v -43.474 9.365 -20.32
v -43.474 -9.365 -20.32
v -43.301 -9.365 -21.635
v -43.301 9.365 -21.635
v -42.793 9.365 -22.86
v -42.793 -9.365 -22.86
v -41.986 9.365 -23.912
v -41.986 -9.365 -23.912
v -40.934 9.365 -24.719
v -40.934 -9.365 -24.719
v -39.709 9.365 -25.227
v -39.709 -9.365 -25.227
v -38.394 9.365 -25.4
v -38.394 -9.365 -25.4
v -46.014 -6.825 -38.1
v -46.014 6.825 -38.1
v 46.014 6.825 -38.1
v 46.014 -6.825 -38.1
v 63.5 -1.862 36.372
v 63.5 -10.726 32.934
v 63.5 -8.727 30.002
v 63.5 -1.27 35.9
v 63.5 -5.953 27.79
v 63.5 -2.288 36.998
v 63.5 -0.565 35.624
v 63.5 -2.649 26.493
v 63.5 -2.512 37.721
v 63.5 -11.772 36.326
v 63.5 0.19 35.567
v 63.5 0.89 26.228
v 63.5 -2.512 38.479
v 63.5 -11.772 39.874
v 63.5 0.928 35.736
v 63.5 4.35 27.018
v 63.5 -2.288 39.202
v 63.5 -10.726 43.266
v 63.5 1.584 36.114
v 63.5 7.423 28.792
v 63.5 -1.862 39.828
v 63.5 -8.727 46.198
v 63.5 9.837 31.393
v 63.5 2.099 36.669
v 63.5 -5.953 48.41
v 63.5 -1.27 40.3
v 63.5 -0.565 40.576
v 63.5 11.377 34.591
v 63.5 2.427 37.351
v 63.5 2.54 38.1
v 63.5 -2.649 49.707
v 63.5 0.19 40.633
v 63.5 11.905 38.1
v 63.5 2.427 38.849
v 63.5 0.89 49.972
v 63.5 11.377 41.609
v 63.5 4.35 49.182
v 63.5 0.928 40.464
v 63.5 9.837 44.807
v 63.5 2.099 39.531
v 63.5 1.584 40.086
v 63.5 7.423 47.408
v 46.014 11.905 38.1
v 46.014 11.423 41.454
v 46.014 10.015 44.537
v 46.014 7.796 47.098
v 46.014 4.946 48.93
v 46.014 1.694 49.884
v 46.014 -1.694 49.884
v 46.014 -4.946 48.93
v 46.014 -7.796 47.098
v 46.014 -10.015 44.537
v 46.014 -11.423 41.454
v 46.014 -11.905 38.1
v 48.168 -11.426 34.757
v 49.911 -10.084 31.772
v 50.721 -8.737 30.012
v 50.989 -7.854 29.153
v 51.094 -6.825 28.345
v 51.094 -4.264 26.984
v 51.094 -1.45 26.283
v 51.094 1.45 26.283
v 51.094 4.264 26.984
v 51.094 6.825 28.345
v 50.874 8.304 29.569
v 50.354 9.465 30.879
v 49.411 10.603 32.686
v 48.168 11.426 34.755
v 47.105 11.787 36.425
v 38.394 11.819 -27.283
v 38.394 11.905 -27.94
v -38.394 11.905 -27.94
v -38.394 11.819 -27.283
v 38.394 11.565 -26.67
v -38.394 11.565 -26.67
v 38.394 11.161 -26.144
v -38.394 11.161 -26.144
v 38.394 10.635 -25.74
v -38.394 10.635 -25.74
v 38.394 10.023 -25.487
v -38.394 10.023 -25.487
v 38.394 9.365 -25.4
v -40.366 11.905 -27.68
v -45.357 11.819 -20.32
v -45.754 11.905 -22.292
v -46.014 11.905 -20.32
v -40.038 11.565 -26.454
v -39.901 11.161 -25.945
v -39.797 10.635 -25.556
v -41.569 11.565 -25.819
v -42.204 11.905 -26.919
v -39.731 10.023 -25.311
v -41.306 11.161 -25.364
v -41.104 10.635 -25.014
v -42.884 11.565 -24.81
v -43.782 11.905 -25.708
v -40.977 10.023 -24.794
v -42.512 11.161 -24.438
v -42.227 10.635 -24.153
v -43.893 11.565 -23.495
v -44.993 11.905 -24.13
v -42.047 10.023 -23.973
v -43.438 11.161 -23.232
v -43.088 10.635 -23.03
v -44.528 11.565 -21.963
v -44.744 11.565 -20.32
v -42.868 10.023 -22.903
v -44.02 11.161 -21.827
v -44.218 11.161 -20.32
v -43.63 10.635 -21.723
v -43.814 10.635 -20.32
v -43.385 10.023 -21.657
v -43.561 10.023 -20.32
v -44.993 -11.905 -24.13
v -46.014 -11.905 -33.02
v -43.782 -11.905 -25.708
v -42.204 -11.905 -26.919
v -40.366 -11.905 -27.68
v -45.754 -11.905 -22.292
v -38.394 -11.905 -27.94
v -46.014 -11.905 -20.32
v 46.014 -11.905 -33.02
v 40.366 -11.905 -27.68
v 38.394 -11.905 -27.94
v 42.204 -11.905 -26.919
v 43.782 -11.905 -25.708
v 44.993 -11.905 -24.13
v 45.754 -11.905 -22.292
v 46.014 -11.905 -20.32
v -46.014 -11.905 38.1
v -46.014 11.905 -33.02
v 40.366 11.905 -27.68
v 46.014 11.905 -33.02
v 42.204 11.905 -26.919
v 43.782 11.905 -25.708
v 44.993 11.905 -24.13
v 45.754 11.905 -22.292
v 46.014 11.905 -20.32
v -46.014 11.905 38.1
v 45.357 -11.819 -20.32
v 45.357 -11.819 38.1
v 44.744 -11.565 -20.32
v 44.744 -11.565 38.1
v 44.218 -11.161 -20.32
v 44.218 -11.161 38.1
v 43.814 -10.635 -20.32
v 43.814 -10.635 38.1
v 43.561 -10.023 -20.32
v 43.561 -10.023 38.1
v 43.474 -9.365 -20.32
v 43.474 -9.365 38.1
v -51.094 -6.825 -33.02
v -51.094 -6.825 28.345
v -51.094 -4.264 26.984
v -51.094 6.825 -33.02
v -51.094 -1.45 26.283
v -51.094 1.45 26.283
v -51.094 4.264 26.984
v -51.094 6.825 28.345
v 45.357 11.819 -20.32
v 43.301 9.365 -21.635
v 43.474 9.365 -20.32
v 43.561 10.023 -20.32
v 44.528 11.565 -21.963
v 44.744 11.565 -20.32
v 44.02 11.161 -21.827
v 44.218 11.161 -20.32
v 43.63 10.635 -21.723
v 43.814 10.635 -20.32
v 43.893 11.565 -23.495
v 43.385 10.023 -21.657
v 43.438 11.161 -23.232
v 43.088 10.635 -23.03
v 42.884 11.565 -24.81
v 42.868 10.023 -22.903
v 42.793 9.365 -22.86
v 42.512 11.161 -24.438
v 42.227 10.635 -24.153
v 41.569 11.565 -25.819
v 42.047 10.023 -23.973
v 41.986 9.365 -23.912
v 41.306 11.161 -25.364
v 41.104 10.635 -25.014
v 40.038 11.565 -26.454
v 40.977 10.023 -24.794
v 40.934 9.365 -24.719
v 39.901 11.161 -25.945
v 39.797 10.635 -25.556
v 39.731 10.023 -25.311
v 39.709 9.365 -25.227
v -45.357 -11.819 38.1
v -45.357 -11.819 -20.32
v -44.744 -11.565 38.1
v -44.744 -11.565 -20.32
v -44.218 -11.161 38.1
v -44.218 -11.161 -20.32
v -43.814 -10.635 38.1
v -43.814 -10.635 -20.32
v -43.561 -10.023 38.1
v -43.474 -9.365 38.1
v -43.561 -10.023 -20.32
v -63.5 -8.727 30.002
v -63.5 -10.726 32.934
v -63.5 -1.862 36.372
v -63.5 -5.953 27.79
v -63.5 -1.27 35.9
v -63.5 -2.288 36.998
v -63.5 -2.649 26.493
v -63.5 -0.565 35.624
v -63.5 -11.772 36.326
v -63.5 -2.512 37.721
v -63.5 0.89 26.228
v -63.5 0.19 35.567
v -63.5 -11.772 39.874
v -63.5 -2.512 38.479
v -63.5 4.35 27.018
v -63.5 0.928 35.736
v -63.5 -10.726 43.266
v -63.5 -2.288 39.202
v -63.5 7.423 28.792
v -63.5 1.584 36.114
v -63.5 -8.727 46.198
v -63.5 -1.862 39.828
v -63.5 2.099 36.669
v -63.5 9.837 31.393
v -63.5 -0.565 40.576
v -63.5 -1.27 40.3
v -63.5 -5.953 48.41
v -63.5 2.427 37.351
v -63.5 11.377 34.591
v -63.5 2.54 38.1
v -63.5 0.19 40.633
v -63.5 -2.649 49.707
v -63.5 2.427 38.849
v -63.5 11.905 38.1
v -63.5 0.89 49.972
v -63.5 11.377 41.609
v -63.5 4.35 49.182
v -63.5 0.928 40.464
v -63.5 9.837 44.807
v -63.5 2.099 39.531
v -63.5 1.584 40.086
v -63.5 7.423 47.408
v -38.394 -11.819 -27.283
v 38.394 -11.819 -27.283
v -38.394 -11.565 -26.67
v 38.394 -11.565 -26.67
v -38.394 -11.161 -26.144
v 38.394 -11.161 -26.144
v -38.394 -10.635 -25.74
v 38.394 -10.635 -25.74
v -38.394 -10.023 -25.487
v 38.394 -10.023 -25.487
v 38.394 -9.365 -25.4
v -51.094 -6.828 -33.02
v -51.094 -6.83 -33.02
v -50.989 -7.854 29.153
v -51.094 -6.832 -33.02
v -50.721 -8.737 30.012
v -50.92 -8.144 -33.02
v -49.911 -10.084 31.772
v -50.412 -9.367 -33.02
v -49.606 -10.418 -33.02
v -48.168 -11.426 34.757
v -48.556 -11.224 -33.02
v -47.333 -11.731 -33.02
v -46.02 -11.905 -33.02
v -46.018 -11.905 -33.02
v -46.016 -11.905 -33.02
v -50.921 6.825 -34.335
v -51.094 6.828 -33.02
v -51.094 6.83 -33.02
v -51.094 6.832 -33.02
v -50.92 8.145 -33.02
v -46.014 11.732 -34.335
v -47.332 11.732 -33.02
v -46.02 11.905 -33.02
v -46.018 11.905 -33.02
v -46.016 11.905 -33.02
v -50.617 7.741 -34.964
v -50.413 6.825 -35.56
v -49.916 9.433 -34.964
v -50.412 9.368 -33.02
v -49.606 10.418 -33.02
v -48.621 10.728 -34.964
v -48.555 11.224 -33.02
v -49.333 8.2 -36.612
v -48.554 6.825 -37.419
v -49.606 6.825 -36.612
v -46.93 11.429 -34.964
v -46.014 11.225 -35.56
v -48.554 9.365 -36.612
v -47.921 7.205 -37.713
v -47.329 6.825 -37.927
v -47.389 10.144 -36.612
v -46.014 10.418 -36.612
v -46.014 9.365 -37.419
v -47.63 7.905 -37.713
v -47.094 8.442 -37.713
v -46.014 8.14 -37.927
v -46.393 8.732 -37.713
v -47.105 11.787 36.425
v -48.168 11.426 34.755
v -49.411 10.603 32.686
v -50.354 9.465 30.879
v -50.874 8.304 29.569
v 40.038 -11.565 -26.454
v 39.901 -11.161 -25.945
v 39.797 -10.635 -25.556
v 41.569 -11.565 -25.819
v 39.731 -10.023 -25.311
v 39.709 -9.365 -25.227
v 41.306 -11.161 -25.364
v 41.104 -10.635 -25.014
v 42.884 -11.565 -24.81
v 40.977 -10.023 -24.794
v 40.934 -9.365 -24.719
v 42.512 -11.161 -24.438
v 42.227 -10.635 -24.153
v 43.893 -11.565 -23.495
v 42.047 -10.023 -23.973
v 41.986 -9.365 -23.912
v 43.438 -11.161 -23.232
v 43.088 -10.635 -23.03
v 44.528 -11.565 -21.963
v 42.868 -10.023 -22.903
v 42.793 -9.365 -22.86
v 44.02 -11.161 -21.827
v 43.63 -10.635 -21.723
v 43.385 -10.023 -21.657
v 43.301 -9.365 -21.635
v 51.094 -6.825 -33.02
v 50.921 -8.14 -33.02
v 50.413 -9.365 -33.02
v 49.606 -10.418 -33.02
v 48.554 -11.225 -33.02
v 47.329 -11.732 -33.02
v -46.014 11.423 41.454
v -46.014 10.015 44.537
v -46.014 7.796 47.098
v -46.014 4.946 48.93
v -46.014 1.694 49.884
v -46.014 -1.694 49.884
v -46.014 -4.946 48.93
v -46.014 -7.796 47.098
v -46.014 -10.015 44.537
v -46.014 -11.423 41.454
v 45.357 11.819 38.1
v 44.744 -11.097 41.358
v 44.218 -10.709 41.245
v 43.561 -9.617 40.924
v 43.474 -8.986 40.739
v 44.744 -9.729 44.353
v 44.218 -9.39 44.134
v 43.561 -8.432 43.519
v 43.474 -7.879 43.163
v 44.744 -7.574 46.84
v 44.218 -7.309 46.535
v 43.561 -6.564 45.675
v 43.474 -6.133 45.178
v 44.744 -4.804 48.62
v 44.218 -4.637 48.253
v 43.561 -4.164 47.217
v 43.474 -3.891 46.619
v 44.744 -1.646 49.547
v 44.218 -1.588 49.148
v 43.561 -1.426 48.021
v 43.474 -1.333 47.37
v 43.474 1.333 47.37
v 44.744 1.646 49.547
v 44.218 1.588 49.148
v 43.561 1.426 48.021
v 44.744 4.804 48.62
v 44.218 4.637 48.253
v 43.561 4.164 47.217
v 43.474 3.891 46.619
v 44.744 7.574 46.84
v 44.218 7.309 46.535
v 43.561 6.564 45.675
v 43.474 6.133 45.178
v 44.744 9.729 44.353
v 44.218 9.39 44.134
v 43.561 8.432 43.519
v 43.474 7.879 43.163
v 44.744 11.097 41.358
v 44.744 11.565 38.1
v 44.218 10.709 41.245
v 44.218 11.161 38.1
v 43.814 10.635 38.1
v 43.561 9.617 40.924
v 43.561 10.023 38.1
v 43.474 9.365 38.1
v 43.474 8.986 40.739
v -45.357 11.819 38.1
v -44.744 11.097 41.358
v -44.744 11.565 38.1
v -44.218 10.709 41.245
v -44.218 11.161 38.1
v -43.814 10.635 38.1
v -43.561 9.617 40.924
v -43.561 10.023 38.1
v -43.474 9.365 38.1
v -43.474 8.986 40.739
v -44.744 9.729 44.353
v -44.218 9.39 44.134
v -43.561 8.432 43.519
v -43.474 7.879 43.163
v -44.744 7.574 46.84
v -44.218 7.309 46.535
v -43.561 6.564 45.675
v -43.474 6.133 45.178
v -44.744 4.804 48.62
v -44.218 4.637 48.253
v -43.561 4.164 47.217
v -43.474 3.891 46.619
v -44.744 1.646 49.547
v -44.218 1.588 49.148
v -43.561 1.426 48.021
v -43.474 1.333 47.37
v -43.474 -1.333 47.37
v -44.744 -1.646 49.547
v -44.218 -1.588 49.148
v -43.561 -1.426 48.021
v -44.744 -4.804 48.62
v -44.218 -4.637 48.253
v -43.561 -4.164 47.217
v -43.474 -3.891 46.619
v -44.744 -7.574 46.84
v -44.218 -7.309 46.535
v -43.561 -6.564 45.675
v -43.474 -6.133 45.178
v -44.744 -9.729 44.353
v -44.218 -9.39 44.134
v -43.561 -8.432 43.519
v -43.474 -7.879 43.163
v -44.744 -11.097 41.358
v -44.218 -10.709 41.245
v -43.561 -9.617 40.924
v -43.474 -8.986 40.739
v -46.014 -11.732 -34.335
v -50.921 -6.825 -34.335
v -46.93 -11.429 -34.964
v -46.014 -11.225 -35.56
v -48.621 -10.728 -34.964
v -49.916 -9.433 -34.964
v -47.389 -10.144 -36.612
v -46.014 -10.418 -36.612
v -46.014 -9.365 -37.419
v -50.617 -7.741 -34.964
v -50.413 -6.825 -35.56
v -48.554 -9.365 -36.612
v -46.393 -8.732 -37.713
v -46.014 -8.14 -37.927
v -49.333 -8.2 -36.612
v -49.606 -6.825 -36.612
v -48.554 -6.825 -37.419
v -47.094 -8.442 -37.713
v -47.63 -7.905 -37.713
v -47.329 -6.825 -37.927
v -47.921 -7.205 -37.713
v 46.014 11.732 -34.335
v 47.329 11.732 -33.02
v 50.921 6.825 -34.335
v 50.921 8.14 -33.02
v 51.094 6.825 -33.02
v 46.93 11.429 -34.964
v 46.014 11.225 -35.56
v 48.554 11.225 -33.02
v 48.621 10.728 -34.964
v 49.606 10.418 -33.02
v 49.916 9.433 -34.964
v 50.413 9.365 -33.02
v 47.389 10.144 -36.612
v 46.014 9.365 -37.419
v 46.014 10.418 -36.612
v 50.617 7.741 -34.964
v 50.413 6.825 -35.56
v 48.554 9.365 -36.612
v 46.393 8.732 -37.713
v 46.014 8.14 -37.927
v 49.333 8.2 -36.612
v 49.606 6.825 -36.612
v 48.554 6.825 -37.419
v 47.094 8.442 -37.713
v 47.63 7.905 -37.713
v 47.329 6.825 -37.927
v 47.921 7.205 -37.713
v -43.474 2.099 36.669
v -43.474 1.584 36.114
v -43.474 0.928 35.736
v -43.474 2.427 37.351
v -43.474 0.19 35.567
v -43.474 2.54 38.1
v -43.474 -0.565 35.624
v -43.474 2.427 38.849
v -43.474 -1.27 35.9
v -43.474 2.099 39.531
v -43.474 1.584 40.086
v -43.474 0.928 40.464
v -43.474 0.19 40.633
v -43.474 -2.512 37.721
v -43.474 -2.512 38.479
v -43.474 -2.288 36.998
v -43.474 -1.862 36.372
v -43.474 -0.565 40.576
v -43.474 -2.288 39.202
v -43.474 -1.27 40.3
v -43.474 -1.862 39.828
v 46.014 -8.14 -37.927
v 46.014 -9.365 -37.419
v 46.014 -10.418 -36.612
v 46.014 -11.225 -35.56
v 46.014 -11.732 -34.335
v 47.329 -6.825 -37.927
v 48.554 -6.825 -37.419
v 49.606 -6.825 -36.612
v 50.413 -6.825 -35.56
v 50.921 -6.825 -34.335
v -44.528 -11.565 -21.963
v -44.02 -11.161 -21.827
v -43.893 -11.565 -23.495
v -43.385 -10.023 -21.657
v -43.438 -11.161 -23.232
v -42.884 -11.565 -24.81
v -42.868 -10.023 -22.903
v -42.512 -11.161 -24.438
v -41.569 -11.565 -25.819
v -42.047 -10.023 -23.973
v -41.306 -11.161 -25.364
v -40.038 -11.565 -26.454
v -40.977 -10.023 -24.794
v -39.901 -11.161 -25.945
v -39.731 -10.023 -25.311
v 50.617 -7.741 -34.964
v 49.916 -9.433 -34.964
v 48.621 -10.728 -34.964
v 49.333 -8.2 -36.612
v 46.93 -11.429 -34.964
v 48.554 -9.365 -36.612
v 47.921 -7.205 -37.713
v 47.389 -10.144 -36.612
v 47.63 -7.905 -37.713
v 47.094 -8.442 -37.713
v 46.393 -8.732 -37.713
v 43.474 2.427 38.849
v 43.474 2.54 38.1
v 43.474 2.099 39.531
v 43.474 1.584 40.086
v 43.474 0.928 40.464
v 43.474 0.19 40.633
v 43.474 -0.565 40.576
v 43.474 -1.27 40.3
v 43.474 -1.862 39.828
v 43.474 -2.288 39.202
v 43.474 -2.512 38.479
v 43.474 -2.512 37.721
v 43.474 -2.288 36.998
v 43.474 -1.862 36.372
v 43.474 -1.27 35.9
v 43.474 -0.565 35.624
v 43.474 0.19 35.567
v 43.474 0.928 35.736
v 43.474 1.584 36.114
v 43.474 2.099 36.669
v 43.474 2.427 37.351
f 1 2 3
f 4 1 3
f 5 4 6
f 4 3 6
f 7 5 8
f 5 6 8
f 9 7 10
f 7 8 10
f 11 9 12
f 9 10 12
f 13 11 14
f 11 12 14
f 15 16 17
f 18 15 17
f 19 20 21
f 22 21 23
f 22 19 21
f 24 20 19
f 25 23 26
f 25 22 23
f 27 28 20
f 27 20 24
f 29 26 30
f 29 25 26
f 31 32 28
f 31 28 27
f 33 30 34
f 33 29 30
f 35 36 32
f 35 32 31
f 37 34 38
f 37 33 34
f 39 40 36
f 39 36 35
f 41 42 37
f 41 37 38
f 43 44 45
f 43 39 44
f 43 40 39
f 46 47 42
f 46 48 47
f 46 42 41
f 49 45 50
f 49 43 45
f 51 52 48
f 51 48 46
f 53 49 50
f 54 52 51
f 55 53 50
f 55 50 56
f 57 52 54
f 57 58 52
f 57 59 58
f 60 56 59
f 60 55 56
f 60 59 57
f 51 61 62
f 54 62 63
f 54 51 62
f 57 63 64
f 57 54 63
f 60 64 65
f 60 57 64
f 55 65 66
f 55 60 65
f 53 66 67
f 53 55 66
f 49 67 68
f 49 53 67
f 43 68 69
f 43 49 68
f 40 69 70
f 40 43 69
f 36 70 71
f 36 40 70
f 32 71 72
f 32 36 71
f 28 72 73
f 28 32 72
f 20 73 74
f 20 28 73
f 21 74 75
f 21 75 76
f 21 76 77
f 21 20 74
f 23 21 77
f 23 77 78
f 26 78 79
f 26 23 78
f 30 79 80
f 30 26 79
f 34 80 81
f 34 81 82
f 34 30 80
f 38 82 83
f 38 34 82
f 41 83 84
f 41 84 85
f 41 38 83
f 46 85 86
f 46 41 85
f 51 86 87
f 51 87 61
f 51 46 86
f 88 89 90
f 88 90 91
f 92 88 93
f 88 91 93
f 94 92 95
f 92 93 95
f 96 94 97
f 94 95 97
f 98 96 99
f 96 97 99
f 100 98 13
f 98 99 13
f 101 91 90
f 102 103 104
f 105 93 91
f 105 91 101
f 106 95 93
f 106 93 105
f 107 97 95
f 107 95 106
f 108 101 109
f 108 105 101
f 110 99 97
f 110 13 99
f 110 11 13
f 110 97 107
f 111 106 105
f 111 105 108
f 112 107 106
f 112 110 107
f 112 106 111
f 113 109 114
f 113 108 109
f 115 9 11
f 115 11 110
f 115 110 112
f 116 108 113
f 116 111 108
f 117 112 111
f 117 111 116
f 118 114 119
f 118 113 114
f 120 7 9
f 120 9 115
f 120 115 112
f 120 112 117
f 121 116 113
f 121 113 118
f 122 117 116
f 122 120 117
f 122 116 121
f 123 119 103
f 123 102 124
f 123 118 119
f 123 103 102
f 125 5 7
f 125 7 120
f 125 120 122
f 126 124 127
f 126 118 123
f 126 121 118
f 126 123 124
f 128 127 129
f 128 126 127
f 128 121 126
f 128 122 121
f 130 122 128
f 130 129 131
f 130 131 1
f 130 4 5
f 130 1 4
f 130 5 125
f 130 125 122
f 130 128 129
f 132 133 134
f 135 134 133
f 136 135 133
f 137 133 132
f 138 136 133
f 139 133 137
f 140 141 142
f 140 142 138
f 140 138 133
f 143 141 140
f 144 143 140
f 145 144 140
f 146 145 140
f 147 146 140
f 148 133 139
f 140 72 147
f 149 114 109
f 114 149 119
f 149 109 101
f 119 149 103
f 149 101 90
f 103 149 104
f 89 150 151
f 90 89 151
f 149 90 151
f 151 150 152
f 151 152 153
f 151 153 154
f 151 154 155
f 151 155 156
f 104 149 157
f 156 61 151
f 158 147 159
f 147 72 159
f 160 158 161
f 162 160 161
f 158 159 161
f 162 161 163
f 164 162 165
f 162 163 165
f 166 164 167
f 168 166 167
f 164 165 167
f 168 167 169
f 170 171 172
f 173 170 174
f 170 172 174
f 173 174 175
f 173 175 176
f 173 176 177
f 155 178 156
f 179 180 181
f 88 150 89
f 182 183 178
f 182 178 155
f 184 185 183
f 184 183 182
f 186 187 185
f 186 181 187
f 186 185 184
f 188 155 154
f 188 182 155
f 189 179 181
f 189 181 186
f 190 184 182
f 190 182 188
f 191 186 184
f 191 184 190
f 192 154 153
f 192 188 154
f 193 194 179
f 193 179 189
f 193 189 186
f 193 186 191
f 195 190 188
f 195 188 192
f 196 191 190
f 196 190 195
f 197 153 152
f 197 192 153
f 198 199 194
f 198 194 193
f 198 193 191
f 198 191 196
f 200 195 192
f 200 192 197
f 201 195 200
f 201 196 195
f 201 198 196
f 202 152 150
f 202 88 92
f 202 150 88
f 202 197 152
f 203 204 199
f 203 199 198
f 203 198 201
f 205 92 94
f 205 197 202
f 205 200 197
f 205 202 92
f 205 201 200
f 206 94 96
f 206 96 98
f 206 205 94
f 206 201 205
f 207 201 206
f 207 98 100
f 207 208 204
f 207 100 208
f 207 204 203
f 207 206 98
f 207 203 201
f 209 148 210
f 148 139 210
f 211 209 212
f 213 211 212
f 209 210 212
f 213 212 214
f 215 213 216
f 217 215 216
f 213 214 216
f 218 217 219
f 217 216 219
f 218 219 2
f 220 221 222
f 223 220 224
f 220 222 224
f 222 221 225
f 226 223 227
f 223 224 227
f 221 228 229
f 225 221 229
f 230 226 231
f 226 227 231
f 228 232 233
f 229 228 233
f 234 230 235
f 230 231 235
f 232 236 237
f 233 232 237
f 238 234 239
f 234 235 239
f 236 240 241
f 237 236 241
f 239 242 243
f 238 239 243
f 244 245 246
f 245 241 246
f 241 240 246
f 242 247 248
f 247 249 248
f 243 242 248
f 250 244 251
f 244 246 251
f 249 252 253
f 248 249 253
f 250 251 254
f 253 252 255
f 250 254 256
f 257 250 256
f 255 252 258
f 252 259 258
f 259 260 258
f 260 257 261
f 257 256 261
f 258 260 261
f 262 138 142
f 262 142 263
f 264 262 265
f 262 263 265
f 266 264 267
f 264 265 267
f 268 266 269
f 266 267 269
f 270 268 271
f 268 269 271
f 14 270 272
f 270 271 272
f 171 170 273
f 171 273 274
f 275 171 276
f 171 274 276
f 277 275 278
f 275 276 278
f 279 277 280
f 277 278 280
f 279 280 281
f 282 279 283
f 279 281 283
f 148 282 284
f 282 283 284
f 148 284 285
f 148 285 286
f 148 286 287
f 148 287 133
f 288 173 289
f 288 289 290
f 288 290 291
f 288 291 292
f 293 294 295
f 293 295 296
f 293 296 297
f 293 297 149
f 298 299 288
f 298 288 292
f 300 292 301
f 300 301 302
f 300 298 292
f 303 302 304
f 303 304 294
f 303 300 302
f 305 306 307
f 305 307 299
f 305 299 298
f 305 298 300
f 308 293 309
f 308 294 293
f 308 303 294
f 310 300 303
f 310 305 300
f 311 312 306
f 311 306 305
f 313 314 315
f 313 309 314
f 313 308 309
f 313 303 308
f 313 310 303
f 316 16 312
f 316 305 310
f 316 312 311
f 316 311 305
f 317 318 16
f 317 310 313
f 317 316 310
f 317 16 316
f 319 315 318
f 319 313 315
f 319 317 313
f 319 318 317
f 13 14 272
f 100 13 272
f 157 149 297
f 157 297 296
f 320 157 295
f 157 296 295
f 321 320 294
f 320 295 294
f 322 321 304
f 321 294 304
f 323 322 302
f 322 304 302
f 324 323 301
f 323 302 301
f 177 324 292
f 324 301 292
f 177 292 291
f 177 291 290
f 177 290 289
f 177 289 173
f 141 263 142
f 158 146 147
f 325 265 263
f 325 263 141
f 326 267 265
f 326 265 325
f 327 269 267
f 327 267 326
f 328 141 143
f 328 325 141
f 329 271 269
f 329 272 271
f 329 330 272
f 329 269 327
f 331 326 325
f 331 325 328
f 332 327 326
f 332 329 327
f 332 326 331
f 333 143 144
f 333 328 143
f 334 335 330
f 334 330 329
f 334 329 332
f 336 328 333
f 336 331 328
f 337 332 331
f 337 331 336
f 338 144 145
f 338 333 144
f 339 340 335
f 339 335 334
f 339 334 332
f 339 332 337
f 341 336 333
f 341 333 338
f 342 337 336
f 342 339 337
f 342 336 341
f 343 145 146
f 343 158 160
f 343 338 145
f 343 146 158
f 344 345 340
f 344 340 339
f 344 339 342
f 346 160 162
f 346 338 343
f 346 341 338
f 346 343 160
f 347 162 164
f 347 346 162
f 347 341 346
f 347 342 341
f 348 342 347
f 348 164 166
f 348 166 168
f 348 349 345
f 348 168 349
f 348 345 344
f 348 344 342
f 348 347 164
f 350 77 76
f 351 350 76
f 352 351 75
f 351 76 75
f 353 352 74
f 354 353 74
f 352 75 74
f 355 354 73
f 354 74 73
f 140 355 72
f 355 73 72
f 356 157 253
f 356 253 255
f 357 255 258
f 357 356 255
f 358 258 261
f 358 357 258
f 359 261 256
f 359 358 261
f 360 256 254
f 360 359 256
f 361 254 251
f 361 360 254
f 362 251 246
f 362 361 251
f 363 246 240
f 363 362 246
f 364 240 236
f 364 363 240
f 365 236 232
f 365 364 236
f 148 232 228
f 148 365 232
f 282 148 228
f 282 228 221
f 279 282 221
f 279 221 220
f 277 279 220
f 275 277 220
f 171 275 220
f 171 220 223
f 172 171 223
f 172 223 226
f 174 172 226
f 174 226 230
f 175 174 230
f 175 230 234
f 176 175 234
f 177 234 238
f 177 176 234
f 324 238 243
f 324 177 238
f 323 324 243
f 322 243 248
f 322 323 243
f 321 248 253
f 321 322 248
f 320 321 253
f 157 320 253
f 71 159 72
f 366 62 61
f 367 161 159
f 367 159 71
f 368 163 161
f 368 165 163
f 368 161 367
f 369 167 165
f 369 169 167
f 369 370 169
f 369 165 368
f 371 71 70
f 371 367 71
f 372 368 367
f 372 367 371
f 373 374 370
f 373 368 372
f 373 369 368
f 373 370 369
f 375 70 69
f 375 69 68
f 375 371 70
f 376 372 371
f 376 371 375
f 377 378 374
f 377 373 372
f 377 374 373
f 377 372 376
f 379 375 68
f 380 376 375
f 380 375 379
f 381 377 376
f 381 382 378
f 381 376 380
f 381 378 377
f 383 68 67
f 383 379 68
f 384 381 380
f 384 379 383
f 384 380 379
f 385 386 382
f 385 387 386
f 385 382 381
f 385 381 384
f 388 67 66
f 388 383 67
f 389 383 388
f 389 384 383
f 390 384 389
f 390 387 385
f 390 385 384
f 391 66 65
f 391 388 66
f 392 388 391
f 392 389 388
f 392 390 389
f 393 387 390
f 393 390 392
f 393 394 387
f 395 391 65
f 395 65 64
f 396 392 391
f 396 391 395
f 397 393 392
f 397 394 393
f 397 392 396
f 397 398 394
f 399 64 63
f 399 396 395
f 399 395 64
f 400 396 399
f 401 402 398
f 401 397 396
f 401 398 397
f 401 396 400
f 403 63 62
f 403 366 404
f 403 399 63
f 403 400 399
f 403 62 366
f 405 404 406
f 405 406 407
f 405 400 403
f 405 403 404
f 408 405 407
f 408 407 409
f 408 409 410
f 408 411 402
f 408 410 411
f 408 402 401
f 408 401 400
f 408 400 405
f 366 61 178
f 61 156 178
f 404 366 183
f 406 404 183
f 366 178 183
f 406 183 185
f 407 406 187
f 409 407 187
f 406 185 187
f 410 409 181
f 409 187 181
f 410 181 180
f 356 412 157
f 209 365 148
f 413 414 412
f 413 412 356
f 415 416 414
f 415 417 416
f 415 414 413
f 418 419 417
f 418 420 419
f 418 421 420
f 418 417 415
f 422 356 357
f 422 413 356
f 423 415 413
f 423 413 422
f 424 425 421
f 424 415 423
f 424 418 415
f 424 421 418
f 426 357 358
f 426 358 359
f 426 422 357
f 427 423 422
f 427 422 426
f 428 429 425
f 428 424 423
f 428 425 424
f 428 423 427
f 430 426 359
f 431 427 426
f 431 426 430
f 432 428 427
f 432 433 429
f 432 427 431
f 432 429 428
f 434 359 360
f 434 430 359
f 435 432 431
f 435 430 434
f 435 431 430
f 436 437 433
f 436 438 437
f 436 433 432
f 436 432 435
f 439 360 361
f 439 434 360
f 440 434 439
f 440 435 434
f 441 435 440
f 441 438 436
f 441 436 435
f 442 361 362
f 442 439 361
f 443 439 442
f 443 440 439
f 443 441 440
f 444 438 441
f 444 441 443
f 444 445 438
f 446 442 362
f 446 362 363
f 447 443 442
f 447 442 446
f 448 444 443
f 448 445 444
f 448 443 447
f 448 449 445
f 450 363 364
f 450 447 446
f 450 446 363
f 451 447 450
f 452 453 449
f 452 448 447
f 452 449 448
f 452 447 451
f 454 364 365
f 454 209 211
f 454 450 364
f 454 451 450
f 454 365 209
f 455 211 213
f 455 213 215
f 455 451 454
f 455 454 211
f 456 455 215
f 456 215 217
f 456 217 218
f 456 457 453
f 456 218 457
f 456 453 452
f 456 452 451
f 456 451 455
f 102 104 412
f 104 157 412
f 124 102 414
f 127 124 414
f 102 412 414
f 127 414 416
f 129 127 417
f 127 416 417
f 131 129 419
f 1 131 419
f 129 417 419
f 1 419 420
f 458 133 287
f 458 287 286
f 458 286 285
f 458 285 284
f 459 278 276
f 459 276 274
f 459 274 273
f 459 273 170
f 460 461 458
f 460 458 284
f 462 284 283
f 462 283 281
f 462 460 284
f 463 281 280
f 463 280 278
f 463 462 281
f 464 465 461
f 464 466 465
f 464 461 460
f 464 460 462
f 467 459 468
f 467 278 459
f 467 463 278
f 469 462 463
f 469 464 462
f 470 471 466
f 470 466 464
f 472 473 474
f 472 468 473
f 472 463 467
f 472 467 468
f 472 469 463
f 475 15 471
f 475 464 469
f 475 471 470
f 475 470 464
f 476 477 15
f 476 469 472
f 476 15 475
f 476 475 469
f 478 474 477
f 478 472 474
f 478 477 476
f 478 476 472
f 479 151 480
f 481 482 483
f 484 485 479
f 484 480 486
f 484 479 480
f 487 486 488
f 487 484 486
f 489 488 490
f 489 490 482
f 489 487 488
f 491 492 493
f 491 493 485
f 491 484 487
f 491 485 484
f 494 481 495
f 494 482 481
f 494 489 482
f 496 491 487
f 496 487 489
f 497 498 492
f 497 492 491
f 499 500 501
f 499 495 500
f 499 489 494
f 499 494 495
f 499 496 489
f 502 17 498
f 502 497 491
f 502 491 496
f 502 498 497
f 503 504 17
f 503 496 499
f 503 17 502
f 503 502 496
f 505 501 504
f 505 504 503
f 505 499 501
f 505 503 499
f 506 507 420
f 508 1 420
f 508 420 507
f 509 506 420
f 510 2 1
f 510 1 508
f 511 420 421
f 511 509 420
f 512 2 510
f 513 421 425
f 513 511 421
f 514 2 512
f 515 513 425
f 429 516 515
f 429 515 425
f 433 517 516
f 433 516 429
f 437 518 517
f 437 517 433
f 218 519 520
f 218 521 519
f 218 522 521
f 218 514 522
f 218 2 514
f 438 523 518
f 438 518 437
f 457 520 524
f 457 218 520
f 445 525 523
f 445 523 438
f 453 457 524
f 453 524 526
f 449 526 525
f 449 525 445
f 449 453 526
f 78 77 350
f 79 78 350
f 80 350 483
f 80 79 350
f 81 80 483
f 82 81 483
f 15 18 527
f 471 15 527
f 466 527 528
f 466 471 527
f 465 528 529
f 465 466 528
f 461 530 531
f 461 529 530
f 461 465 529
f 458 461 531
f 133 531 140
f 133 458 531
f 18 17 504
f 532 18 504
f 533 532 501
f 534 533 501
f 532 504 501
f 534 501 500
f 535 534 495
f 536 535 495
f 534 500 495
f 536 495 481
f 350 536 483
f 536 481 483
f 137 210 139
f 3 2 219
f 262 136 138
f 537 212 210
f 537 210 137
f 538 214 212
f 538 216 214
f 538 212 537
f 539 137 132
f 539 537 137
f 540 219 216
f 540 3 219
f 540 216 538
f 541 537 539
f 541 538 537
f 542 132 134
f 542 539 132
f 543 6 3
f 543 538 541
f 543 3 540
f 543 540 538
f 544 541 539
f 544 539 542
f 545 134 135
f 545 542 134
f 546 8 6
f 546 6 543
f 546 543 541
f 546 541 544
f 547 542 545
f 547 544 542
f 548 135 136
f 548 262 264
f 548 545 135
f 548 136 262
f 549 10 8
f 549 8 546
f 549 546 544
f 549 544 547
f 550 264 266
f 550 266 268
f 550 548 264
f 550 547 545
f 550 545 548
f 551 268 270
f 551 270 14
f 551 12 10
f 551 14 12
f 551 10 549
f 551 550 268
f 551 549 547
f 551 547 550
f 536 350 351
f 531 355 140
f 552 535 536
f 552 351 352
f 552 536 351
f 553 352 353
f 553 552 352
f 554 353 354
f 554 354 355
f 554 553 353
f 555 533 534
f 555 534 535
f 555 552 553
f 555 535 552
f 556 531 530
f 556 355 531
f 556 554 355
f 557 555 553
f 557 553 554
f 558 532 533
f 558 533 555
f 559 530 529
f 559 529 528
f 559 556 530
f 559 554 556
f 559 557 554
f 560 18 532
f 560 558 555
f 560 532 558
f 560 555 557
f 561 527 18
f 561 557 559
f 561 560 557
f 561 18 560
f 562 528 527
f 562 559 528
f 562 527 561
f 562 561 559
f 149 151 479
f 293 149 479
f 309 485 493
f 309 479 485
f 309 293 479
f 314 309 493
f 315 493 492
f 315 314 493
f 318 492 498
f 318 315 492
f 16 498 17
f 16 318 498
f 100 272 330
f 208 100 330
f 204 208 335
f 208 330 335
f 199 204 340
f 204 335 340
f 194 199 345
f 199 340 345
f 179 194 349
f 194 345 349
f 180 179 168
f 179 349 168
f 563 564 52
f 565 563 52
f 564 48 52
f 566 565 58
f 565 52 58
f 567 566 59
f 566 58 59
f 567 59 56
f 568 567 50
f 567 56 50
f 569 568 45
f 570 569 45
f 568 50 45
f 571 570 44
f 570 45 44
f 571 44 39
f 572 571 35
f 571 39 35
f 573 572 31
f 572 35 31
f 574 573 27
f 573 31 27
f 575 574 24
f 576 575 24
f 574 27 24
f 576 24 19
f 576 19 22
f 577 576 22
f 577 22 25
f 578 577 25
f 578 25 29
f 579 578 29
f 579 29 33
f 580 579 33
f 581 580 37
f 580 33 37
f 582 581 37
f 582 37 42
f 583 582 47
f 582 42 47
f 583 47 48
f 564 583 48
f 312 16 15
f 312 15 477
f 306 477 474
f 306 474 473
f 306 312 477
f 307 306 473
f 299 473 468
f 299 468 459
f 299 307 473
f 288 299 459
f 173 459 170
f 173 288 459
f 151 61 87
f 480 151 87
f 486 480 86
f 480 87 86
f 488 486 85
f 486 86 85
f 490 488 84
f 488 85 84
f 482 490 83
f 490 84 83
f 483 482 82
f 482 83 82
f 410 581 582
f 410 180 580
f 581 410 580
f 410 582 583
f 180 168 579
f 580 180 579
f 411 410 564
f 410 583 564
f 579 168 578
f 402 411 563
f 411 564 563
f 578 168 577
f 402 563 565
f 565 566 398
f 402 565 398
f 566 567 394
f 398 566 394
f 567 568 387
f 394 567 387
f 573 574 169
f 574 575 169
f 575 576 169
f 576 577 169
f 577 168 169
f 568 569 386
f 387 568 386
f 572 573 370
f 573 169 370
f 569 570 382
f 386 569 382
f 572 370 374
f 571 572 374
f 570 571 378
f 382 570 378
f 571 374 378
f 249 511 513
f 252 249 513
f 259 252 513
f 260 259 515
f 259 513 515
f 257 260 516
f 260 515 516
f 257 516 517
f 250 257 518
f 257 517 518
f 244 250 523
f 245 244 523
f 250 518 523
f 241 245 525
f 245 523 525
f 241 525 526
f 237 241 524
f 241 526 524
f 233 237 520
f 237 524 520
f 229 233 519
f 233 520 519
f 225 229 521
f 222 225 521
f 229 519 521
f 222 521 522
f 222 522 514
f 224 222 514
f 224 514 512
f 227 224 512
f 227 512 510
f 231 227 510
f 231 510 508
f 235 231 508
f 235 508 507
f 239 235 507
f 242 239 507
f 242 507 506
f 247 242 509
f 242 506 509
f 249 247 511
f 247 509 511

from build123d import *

# Parameters (mm, degrees)
F0_W          = 102.1880283952
F0_H          = 23.8108858466
F1_DEPTH      = 38.1
F2_R          = 11.9054429233
F3_DEPTH      = 63.5
F4_W          = 86.9480283952
F4_H          = 88.2315921943
F5_DEPTH      = 25.4
F6_R          = 2.54
F7_DEPTH      = 63.5
F8_T1_DEPTH   = 127.5880283952
F8_T6_DEPTH   = 101.6
F8_S7_R       = 11.9054429233
F8_T8_DEPTH   = 52
F8_T12_DEPTH  = 101.6
F8_S13_R      = 11.9054429233
F8_T14_DEPTH  = 52
F9_T1_DEPTH   = 127.5880283952
F9_T6_DEPTH   = 101.6
F9_S7_R       = 11.9054429233
F9_T8_DEPTH   = 52
F9_T12_DEPTH  = 101.6
F9_S13_R      = 11.9054429233
F9_T14_DEPTH  = 52
F10_T1_DEPTH  = 13.6508858466
F10_S5_W      = 5.08
F10_S5_H      = 5.08
F10_T6_DEPTH  = 5.08
F10_S11_W     = 5.08
F10_S11_H     = 5.08
F10_T12_DEPTH = 5.08
F10_S17_W     = 5.08
F10_S17_H     = 5.08
F10_T18_DEPTH = 5.08
F10_S23_W     = 5.08
F10_S23_H     = 5.08
F10_T24_DEPTH = 5.08
F11_R         = 5.08
F12_R         = 2.53999


# Not quite as in the source:
# - a fillet or chamfer that OpenCascade refuses, or shapes differently, is made with other operations: its cross-section is extruded or revolved along the edge and cut away or added
# - a fillet or chamfer is up to 0.001 mm smaller than in the source, because OpenCascade refuses the exact size


with BuildPart() as f1:
    # F0 (on Top) → F1 (new body, symmetric)
    with BuildSketch(Plane.XY):
        Rectangle(F0_W, F0_H)
    extrude(amount=F1_DEPTH, both=True)

    # F2 (on Right) → F3 (join, symmetric)
    with BuildSketch(Plane.YZ):
        with Locations((0, 38.1)):
            Circle(F2_R)
    extrude(amount=F3_DEPTH, both=True)

    # F4 (on Front) → F5 (cut, symmetric)
    with BuildSketch(Plane.XZ):
        with Locations((0, 18.7157960971)):
            Rectangle(F4_W, F4_H)
    extrude(amount=F5_DEPTH, both=True, mode=Mode.SUBTRACT)

    # F6 (on Right) → F7 (cut, symmetric)
    with BuildSketch(Plane.YZ):
        with Locations((0, 38.1)):
            Circle(F6_R)
    extrude(amount=F7_DEPTH, both=True, mode=Mode.SUBTRACT)

    # F8: fillet of radius 5.08 on 3 edges, made by hand

    # F8_s2 → F8_t1 (cut)
    with BuildSketch(Plane.YZ.offset(-63.7940141976)):
        with BuildLine():
            ThreePointArc((-6.8254429233, -38.1), (-10.4175453717, -36.6121024484), (-11.9054429233, -33.02))
            Line((-11.9054429233, -33.02), (-11.9054429233, -38.1))
            Line((-11.9054429233, -38.1), (-6.8254429233, -38.1))
        make_face()
    extrude(amount=F8_T1_DEPTH, mode=Mode.SUBTRACT)


with BuildPart() as f8_tool4:
    # F8_s5 → F8_t6 (new body)
    with BuildSketch(Plane.XY.offset(50.8)):
        with BuildLine():
            ThreePointArc((51.0940141976, -6.8254429233), (49.606116646, -10.4175453717), (46.0140141976, -11.9054429233))
            Line((46.0140141976, -11.9054429233), (51.0940141976, -11.9054429233))
            Line((51.0940141976, -11.9054429233), (51.0940141976, -6.8254429233))
        make_face()
    extrude(amount=-F8_T6_DEPTH)

    # F8_s7 → F8_t8 (cut, symmetric)
    with BuildSketch(Plane.YZ.offset(48.6)):
        with Locations((0, 38.1)):
            Circle(F8_S7_R)
    extrude(amount=F8_T8_DEPTH, both=True, mode=Mode.SUBTRACT)


with BuildPart() as f1_1:
    add(f1.part)

    # F8_t3: cut F8_tool4
    add(f8_tool4.part, mode=Mode.SUBTRACT)


with BuildPart() as f8_tool10:
    # F8_s11 → F8_t12 (new body)
    with BuildSketch(Plane.XY.offset(-50.8)):
        with BuildLine():
            ThreePointArc((-51.0940141976, -6.8254429233), (-49.606116646, -10.4175453717), (-46.0140141976, -11.9054429233))
            Line((-46.0140141976, -11.9054429233), (-51.0940141976, -11.9054429233))
            Line((-51.0940141976, -11.9054429233), (-51.0940141976, -6.8254429233))
        make_face()
    extrude(amount=F8_T12_DEPTH)

    # F8_s13 → F8_t14 (cut, symmetric)
    with BuildSketch(Plane.YZ.offset(-48.6)):
        with Locations((0, 38.1)):
            Circle(F8_S13_R)
    extrude(amount=F8_T14_DEPTH, both=True, mode=Mode.SUBTRACT)


with BuildPart() as f1_2:
    add(f1_1.part)

    # F8_t9: cut F8_tool10
    add(f8_tool10.part, mode=Mode.SUBTRACT)

    # F9: fillet of radius 5.08 on 3 edges, made by hand

    # F9_s2 → F9_t1 (cut)
    with BuildSketch(Plane.YZ.offset(-63.7940141976)):
        with BuildLine():
            ThreePointArc((11.9054429233, -33.02), (10.4175453717, -36.6121024484), (6.8254429233, -38.1))
            Line((6.8254429233, -38.1), (11.9054429233, -38.1))
            Line((11.9054429233, -38.1), (11.9054429233, -33.02))
        make_face()
    extrude(amount=F9_T1_DEPTH, mode=Mode.SUBTRACT)


with BuildPart() as f9_tool4:
    # F9_s5 → F9_t6 (new body)
    with BuildSketch(Plane.XY.offset(-50.8)):
        with BuildLine():
            ThreePointArc((-46.0140141976, 11.9054429233), (-49.606116646, 10.4175453717), (-51.0940141976, 6.8254429233))
            Line((-51.0940141976, 6.8254429233), (-51.0940141976, 11.9054429233))
            Line((-51.0940141976, 11.9054429233), (-46.0140141976, 11.9054429233))
        make_face()
    extrude(amount=F9_T6_DEPTH)

    # F9_s7 → F9_t8 (cut, symmetric)
    with BuildSketch(Plane.YZ.offset(-48.6)):
        with Locations((0, 38.1)):
            Circle(F9_S7_R)
    extrude(amount=F9_T8_DEPTH, both=True, mode=Mode.SUBTRACT)


with BuildPart() as f1_3:
    add(f1_2.part)

    # F9_t3: cut F9_tool4
    add(f9_tool4.part, mode=Mode.SUBTRACT)


with BuildPart() as f9_tool10:
    # F9_s11 → F9_t12 (new body)
    with BuildSketch(Plane.XY.offset(50.8)):
        with BuildLine():
            ThreePointArc((46.0140141976, 11.9054429233), (49.606116646, 10.4175453717), (51.0940141976, 6.8254429233))
            Line((51.0940141976, 6.8254429233), (51.0940141976, 11.9054429233))
            Line((51.0940141976, 11.9054429233), (46.0140141976, 11.9054429233))
        make_face()
    extrude(amount=-F9_T12_DEPTH)

    # F9_s13 → F9_t14 (cut, symmetric)
    with BuildSketch(Plane.YZ.offset(48.6)):
        with Locations((0, 38.1)):
            Circle(F9_S13_R)
    extrude(amount=F9_T14_DEPTH, both=True, mode=Mode.SUBTRACT)


with BuildPart() as f1_4:
    add(f1_3.part)

    # F9_t9: cut F9_tool10
    add(f9_tool10.part, mode=Mode.SUBTRACT)

    # F10: fillet of radius 5.08 on 2 edges, made by hand

    # F10_s2 → F10_t1 (cut)
    with BuildSketch(Plane.XZ.offset(-6.8254429233)):
        with BuildLine():
            ThreePointArc((-46.0140141976, -38.1), (-49.606116646, -36.6121024484), (-51.0940141976, -33.02))
            Line((-51.0940141976, -33.02), (-51.0940141976, -38.1))
            Line((-51.0940141976, -38.1), (-46.0140141976, -38.1))
        make_face()
        with BuildLine():
            ThreePointArc((46.0140141976, -38.1), (49.606116646, -36.6121024484), (51.0940141976, -33.02))
            Line((51.0940141976, -33.02), (51.0940141976, -38.1))
            Line((51.0940141976, -38.1), (46.0140141976, -38.1))
        make_face()
    extrude(amount=F10_T1_DEPTH, mode=Mode.SUBTRACT)


with BuildPart() as f10_tool4:
    # F10_s5 → F10_t6 (new body)
    with BuildSketch(Plane.XY.offset(-33.02)):
        with Locations((48.5540141976, -9.3654429233)):
            Rectangle(F10_S5_W, F10_S5_H)
    extrude(amount=-F10_T6_DEPTH)

    # F10_s7 → F10_t8 (revolve, cut)
    with BuildSketch(Plane(origin=(46.0140141976, -6.8254429233, -33.02), x_dir=(-0.7071067812, 0.7071067812, 0), z_dir=(-0.7071067812, -0.7071067812, 0))):
        with BuildLine():
            ThreePointArc((0, -5.08), (5.08, 0), (0, 5.08))
            Line((0, 5.08), (0, -5.08))
        make_face()
    revolve(axis=Axis((46.0140141976, -6.8254429233, -33.02), (0, 0, -1)), mode=Mode.SUBTRACT)


with BuildPart() as f1_5:
    add(f1_4.part)

    # F10_t3: cut F10_tool4
    add(f10_tool4.part, mode=Mode.SUBTRACT)


with BuildPart() as f10_tool10:
    # F10_s11 → F10_t12 (new body)
    with BuildSketch(Plane.XY.offset(-33.02)):
        with Locations((48.5540141976, 9.3654429233)):
            Rectangle(F10_S11_W, F10_S11_H)
    extrude(amount=-F10_T12_DEPTH)

    # F10_s13 → F10_t14 (revolve, cut)
    with BuildSketch(Plane(origin=(46.0140141976, 6.8254429233, -33.02), x_dir=(-0.7071067812, -0.7071067812, 0), z_dir=(0.7071067812, -0.7071067812, 0))):
        with BuildLine():
            ThreePointArc((0, -5.08), (5.08, 0), (0, 5.08))
            Line((0, 5.08), (0, -5.08))
        make_face()
    revolve(axis=Axis((46.0140141976, 6.8254429233, -33.02), (0, 0, -1)), mode=Mode.SUBTRACT)


with BuildPart() as f1_6:
    add(f1_5.part)

    # F10_t9: cut F10_tool10
    add(f10_tool10.part, mode=Mode.SUBTRACT)


with BuildPart() as f10_tool16:
    # F10_s17 → F10_t18 (new body)
    with BuildSketch(Plane.XY.offset(-33.02)):
        with Locations((-48.5540141976, 9.3654429233)):
            Rectangle(F10_S17_W, F10_S17_H)
    extrude(amount=-F10_T18_DEPTH)

    # F10_s19 → F10_t20 (revolve, cut)
    with BuildSketch(Plane(origin=(-46.0140141976, 6.8254429233, -33.02), x_dir=(0.7071067812, -0.7071067812, 0), z_dir=(0.7071067812, 0.7071067812, 0))):
        with BuildLine():
            ThreePointArc((0, -5.08), (5.08, 0), (0, 5.08))
            Line((0, 5.08), (0, -5.08))
        make_face()
    revolve(axis=Axis((-46.0140141976, 6.8254429233, -33.02), (0, 0, -1)), mode=Mode.SUBTRACT)


with BuildPart() as f1_7:
    add(f1_6.part)

    # F10_t15: cut F10_tool16
    add(f10_tool16.part, mode=Mode.SUBTRACT)


with BuildPart() as f10_tool22:
    # F10_s23 → F10_t24 (new body)
    with BuildSketch(Plane.XY.offset(-33.02)):
        with Locations((-48.5540141976, -9.3654429233)):
            Rectangle(F10_S23_W, F10_S23_H)
    extrude(amount=-F10_T24_DEPTH)

    # F10_s25 → F10_t26 (revolve, cut)
    with BuildSketch(Plane(origin=(-46.0140141976, -6.8254429233, -33.02), x_dir=(0.7071067812, 0.7071067812, 0), z_dir=(-0.7071067812, 0.7071067812, 0))):
        with BuildLine():
            ThreePointArc((0, -5.08), (5.08, 0), (0, 5.08))
            Line((0, 5.08), (0, -5.08))
        make_face()
    revolve(axis=Axis((-46.0140141976, -6.8254429233, -33.02), (0, 0, -1)), mode=Mode.SUBTRACT)


with BuildPart() as f1_8:
    add(f1_7.part)

    # F10_t21: cut F10_tool22
    add(f10_tool22.part, mode=Mode.SUBTRACT)

    # F11
    f11_edges = [f1_8.edges().sort_by_distance(p)[0] for p in [
        (-43.474014, 0, -25.4),
        (43.474014, 0, -25.4),
    ]]
    fillet(f11_edges, radius=F11_R)

    # F12 (radius 2.54 in the source; OpenCascade refuses exactly that, so slightly less here)
    f12_edges = [f1_8.edges().sort_by_distance(p)[0] for p in [
        (0, -11.905443, -25.4),
        (-43.474014, -11.905443, 8.89),
        (-41.986117, -11.905443, -23.912102),
        (41.986117, -11.905443, -23.912102),
        (43.474014, -11.905443, 8.89),
    ]]
    fillet(f12_edges, radius=F12_R)


solid = f1_8.part
